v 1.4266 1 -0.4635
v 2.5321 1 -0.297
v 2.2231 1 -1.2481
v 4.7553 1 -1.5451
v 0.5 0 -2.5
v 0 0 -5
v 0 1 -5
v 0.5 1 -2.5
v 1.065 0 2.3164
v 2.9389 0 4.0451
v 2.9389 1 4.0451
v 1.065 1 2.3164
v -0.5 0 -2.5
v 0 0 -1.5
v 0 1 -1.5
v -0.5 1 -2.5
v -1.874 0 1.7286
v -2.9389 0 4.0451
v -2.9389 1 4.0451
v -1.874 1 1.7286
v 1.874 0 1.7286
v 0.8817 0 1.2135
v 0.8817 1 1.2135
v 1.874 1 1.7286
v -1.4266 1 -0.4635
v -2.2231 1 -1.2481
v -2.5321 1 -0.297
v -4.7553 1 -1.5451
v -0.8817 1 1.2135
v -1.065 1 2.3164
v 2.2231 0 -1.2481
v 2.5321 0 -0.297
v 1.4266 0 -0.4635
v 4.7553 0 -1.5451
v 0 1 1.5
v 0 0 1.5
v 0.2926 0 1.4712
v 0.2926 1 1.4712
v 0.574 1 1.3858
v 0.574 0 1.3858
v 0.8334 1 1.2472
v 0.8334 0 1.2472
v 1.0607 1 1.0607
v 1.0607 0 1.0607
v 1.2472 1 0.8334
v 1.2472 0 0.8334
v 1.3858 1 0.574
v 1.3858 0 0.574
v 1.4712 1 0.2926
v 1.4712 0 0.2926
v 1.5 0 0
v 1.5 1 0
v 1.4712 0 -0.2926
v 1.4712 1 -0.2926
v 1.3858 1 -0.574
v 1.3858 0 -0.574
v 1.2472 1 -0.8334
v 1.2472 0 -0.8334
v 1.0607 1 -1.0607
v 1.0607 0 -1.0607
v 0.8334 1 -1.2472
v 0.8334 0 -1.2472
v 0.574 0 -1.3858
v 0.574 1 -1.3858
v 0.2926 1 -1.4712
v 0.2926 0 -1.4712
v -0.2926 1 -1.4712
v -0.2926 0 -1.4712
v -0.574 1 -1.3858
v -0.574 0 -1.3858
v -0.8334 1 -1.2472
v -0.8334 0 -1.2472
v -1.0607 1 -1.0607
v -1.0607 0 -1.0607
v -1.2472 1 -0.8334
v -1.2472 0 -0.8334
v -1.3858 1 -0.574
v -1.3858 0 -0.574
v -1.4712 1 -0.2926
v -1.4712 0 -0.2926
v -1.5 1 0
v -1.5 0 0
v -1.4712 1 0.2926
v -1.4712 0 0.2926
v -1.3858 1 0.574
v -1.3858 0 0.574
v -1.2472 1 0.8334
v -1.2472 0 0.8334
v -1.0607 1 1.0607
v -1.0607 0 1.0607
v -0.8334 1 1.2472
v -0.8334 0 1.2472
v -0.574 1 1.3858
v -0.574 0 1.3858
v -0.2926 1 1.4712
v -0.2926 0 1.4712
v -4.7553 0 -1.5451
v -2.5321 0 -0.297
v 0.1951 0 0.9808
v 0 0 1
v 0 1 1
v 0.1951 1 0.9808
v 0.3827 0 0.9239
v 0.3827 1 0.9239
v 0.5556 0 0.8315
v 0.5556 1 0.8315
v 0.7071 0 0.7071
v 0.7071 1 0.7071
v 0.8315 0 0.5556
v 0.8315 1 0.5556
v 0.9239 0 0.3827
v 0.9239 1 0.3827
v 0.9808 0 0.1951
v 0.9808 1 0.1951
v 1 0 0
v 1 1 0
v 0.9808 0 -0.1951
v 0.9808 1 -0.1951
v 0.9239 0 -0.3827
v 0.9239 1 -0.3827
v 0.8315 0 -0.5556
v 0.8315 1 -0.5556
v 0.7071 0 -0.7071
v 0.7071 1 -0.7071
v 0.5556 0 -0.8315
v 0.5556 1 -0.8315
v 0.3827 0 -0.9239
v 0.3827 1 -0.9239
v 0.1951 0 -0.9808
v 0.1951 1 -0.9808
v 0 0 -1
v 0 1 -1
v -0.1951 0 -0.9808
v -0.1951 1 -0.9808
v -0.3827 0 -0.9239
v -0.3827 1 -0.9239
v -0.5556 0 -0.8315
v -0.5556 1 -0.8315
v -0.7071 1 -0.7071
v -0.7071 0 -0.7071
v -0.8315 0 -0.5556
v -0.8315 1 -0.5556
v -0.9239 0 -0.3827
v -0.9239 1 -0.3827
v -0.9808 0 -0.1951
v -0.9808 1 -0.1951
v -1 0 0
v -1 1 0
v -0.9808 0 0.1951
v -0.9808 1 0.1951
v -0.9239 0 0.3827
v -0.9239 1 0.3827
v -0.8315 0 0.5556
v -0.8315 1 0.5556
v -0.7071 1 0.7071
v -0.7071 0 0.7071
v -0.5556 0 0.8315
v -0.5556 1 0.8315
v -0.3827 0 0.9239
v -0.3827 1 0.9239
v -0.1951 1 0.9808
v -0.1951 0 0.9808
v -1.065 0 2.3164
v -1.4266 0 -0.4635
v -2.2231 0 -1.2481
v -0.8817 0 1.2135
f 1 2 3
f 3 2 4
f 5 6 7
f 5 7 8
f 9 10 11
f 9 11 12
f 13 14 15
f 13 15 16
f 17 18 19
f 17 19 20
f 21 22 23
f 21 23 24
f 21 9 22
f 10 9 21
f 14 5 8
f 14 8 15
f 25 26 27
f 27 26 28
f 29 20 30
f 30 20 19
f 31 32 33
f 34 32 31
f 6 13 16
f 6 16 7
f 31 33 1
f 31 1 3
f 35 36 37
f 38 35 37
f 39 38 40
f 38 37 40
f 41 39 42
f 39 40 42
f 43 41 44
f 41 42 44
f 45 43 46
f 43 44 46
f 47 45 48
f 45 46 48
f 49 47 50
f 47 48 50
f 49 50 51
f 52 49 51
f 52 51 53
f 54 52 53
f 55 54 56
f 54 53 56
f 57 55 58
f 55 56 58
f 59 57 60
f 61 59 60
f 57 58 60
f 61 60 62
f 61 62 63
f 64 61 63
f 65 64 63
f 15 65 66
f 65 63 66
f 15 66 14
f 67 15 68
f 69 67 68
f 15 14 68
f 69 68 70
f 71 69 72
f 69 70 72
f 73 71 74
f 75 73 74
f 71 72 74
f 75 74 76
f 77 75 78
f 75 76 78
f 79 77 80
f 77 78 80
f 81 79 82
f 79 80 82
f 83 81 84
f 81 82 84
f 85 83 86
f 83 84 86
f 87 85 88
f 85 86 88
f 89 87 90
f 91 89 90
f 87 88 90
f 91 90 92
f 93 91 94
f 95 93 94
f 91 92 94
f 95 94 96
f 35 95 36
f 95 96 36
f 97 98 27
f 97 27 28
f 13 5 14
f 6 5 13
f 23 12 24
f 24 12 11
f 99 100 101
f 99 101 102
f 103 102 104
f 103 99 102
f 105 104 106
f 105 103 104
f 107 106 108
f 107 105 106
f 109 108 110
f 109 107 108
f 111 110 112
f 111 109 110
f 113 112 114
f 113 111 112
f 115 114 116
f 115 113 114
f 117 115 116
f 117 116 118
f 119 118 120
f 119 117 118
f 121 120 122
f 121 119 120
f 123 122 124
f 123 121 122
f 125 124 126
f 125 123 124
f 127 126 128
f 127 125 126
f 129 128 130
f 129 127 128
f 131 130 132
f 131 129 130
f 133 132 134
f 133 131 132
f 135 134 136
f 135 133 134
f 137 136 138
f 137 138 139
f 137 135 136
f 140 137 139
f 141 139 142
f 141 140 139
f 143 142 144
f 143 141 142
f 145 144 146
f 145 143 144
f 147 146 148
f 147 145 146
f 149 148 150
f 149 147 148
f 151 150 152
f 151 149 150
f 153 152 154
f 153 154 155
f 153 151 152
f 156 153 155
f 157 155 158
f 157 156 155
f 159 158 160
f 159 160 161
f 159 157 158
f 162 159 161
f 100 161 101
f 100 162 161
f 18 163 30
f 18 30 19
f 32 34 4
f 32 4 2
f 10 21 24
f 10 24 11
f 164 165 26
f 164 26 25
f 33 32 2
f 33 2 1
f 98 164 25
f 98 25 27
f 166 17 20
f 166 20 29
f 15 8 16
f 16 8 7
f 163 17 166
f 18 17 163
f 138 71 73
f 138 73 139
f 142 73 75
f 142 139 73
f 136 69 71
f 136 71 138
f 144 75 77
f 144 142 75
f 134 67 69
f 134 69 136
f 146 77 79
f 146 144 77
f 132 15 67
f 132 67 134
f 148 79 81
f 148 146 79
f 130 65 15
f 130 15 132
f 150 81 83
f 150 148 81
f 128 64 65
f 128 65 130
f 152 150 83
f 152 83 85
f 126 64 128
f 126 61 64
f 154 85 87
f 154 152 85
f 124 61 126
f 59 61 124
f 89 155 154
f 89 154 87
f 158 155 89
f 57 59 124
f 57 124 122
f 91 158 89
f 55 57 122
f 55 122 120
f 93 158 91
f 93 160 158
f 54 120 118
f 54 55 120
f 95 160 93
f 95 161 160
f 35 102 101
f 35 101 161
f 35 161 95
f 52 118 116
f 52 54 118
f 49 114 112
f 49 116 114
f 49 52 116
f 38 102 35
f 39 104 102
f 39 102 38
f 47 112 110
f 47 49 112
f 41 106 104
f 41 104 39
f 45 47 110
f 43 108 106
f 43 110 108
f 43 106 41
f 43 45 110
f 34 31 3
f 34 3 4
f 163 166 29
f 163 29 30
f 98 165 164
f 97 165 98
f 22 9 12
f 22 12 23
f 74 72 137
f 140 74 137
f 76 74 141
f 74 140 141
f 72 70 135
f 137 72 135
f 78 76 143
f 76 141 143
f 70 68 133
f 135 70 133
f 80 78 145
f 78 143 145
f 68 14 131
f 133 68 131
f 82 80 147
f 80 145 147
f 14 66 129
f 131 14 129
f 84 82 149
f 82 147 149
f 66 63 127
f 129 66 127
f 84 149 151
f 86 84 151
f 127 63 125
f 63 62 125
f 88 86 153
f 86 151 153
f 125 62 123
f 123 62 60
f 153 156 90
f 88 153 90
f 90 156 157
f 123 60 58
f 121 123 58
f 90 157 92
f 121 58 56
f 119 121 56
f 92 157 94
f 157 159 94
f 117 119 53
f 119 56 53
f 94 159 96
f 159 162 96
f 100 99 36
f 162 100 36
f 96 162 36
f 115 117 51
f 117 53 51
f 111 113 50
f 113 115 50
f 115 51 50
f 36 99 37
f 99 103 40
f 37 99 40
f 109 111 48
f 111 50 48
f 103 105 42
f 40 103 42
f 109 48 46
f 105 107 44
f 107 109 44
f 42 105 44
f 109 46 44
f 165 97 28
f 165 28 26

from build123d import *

# Parameters (mm, degrees)
SKETCH1_R           = 1.5
SKETCH1_R_2         = 1
BOSS_EXTRUDE2_DEPTH = 1
BOSS_EXTRUDE3_DEPTH = 1
CIRPATTERN9_COUNT   = 5


with BuildPart() as part:
    # Sketch1 → Boss-Extrude2 (new body)
    with BuildSketch(Plane(origin=(0, 0, 0), x_dir=(1, 0, 0), z_dir=(0, 1, 0))):
        Circle(SKETCH1_R)
        Circle(SKETCH1_R_2, mode=Mode.SUBTRACT)
    extrude(amount=BOSS_EXTRUDE2_DEPTH)


with BuildPart() as body_2:
    # Sketch2 → Boss-Extrude3 (new body)
    with BuildSketch(Plane(origin=(0, 0, 0), x_dir=(1, 0, 0), z_dir=(0, 1, 0))):
        Polygon((0, 1.5), (-0.5, 2.5), (0, 5), (0.5, 2.5), align=None)
    extrude(amount=BOSS_EXTRUDE3_DEPTH)


with BuildPart() as cirpattern9_1:
    # CirPattern9: pattern copy
    add(body_2.part.rotate(Axis((0, 1, 0), (0, -1, 0)), 1 * 360 / CIRPATTERN9_COUNT))


with BuildPart() as cirpattern9_2:
    # CirPattern9: pattern copy
    add(body_2.part.rotate(Axis((0, 1, 0), (0, -1, 0)), 2 * 360 / CIRPATTERN9_COUNT))


with BuildPart() as cirpattern9_3:
    # CirPattern9: pattern copy
    add(body_2.part.rotate(Axis((0, 1, 0), (0, -1, 0)), 3 * 360 / CIRPATTERN9_COUNT))


with BuildPart() as cirpattern9_4:
    # CirPattern9: pattern copy
    add(body_2.part.rotate(Axis((0, 1, 0), (0, -1, 0)), 4 * 360 / CIRPATTERN9_COUNT))


solid = Compound([part.part, body_2.part, cirpattern9_1.part, cirpattern9_2.part, cirpattern9_3.part, cirpattern9_4.part])
